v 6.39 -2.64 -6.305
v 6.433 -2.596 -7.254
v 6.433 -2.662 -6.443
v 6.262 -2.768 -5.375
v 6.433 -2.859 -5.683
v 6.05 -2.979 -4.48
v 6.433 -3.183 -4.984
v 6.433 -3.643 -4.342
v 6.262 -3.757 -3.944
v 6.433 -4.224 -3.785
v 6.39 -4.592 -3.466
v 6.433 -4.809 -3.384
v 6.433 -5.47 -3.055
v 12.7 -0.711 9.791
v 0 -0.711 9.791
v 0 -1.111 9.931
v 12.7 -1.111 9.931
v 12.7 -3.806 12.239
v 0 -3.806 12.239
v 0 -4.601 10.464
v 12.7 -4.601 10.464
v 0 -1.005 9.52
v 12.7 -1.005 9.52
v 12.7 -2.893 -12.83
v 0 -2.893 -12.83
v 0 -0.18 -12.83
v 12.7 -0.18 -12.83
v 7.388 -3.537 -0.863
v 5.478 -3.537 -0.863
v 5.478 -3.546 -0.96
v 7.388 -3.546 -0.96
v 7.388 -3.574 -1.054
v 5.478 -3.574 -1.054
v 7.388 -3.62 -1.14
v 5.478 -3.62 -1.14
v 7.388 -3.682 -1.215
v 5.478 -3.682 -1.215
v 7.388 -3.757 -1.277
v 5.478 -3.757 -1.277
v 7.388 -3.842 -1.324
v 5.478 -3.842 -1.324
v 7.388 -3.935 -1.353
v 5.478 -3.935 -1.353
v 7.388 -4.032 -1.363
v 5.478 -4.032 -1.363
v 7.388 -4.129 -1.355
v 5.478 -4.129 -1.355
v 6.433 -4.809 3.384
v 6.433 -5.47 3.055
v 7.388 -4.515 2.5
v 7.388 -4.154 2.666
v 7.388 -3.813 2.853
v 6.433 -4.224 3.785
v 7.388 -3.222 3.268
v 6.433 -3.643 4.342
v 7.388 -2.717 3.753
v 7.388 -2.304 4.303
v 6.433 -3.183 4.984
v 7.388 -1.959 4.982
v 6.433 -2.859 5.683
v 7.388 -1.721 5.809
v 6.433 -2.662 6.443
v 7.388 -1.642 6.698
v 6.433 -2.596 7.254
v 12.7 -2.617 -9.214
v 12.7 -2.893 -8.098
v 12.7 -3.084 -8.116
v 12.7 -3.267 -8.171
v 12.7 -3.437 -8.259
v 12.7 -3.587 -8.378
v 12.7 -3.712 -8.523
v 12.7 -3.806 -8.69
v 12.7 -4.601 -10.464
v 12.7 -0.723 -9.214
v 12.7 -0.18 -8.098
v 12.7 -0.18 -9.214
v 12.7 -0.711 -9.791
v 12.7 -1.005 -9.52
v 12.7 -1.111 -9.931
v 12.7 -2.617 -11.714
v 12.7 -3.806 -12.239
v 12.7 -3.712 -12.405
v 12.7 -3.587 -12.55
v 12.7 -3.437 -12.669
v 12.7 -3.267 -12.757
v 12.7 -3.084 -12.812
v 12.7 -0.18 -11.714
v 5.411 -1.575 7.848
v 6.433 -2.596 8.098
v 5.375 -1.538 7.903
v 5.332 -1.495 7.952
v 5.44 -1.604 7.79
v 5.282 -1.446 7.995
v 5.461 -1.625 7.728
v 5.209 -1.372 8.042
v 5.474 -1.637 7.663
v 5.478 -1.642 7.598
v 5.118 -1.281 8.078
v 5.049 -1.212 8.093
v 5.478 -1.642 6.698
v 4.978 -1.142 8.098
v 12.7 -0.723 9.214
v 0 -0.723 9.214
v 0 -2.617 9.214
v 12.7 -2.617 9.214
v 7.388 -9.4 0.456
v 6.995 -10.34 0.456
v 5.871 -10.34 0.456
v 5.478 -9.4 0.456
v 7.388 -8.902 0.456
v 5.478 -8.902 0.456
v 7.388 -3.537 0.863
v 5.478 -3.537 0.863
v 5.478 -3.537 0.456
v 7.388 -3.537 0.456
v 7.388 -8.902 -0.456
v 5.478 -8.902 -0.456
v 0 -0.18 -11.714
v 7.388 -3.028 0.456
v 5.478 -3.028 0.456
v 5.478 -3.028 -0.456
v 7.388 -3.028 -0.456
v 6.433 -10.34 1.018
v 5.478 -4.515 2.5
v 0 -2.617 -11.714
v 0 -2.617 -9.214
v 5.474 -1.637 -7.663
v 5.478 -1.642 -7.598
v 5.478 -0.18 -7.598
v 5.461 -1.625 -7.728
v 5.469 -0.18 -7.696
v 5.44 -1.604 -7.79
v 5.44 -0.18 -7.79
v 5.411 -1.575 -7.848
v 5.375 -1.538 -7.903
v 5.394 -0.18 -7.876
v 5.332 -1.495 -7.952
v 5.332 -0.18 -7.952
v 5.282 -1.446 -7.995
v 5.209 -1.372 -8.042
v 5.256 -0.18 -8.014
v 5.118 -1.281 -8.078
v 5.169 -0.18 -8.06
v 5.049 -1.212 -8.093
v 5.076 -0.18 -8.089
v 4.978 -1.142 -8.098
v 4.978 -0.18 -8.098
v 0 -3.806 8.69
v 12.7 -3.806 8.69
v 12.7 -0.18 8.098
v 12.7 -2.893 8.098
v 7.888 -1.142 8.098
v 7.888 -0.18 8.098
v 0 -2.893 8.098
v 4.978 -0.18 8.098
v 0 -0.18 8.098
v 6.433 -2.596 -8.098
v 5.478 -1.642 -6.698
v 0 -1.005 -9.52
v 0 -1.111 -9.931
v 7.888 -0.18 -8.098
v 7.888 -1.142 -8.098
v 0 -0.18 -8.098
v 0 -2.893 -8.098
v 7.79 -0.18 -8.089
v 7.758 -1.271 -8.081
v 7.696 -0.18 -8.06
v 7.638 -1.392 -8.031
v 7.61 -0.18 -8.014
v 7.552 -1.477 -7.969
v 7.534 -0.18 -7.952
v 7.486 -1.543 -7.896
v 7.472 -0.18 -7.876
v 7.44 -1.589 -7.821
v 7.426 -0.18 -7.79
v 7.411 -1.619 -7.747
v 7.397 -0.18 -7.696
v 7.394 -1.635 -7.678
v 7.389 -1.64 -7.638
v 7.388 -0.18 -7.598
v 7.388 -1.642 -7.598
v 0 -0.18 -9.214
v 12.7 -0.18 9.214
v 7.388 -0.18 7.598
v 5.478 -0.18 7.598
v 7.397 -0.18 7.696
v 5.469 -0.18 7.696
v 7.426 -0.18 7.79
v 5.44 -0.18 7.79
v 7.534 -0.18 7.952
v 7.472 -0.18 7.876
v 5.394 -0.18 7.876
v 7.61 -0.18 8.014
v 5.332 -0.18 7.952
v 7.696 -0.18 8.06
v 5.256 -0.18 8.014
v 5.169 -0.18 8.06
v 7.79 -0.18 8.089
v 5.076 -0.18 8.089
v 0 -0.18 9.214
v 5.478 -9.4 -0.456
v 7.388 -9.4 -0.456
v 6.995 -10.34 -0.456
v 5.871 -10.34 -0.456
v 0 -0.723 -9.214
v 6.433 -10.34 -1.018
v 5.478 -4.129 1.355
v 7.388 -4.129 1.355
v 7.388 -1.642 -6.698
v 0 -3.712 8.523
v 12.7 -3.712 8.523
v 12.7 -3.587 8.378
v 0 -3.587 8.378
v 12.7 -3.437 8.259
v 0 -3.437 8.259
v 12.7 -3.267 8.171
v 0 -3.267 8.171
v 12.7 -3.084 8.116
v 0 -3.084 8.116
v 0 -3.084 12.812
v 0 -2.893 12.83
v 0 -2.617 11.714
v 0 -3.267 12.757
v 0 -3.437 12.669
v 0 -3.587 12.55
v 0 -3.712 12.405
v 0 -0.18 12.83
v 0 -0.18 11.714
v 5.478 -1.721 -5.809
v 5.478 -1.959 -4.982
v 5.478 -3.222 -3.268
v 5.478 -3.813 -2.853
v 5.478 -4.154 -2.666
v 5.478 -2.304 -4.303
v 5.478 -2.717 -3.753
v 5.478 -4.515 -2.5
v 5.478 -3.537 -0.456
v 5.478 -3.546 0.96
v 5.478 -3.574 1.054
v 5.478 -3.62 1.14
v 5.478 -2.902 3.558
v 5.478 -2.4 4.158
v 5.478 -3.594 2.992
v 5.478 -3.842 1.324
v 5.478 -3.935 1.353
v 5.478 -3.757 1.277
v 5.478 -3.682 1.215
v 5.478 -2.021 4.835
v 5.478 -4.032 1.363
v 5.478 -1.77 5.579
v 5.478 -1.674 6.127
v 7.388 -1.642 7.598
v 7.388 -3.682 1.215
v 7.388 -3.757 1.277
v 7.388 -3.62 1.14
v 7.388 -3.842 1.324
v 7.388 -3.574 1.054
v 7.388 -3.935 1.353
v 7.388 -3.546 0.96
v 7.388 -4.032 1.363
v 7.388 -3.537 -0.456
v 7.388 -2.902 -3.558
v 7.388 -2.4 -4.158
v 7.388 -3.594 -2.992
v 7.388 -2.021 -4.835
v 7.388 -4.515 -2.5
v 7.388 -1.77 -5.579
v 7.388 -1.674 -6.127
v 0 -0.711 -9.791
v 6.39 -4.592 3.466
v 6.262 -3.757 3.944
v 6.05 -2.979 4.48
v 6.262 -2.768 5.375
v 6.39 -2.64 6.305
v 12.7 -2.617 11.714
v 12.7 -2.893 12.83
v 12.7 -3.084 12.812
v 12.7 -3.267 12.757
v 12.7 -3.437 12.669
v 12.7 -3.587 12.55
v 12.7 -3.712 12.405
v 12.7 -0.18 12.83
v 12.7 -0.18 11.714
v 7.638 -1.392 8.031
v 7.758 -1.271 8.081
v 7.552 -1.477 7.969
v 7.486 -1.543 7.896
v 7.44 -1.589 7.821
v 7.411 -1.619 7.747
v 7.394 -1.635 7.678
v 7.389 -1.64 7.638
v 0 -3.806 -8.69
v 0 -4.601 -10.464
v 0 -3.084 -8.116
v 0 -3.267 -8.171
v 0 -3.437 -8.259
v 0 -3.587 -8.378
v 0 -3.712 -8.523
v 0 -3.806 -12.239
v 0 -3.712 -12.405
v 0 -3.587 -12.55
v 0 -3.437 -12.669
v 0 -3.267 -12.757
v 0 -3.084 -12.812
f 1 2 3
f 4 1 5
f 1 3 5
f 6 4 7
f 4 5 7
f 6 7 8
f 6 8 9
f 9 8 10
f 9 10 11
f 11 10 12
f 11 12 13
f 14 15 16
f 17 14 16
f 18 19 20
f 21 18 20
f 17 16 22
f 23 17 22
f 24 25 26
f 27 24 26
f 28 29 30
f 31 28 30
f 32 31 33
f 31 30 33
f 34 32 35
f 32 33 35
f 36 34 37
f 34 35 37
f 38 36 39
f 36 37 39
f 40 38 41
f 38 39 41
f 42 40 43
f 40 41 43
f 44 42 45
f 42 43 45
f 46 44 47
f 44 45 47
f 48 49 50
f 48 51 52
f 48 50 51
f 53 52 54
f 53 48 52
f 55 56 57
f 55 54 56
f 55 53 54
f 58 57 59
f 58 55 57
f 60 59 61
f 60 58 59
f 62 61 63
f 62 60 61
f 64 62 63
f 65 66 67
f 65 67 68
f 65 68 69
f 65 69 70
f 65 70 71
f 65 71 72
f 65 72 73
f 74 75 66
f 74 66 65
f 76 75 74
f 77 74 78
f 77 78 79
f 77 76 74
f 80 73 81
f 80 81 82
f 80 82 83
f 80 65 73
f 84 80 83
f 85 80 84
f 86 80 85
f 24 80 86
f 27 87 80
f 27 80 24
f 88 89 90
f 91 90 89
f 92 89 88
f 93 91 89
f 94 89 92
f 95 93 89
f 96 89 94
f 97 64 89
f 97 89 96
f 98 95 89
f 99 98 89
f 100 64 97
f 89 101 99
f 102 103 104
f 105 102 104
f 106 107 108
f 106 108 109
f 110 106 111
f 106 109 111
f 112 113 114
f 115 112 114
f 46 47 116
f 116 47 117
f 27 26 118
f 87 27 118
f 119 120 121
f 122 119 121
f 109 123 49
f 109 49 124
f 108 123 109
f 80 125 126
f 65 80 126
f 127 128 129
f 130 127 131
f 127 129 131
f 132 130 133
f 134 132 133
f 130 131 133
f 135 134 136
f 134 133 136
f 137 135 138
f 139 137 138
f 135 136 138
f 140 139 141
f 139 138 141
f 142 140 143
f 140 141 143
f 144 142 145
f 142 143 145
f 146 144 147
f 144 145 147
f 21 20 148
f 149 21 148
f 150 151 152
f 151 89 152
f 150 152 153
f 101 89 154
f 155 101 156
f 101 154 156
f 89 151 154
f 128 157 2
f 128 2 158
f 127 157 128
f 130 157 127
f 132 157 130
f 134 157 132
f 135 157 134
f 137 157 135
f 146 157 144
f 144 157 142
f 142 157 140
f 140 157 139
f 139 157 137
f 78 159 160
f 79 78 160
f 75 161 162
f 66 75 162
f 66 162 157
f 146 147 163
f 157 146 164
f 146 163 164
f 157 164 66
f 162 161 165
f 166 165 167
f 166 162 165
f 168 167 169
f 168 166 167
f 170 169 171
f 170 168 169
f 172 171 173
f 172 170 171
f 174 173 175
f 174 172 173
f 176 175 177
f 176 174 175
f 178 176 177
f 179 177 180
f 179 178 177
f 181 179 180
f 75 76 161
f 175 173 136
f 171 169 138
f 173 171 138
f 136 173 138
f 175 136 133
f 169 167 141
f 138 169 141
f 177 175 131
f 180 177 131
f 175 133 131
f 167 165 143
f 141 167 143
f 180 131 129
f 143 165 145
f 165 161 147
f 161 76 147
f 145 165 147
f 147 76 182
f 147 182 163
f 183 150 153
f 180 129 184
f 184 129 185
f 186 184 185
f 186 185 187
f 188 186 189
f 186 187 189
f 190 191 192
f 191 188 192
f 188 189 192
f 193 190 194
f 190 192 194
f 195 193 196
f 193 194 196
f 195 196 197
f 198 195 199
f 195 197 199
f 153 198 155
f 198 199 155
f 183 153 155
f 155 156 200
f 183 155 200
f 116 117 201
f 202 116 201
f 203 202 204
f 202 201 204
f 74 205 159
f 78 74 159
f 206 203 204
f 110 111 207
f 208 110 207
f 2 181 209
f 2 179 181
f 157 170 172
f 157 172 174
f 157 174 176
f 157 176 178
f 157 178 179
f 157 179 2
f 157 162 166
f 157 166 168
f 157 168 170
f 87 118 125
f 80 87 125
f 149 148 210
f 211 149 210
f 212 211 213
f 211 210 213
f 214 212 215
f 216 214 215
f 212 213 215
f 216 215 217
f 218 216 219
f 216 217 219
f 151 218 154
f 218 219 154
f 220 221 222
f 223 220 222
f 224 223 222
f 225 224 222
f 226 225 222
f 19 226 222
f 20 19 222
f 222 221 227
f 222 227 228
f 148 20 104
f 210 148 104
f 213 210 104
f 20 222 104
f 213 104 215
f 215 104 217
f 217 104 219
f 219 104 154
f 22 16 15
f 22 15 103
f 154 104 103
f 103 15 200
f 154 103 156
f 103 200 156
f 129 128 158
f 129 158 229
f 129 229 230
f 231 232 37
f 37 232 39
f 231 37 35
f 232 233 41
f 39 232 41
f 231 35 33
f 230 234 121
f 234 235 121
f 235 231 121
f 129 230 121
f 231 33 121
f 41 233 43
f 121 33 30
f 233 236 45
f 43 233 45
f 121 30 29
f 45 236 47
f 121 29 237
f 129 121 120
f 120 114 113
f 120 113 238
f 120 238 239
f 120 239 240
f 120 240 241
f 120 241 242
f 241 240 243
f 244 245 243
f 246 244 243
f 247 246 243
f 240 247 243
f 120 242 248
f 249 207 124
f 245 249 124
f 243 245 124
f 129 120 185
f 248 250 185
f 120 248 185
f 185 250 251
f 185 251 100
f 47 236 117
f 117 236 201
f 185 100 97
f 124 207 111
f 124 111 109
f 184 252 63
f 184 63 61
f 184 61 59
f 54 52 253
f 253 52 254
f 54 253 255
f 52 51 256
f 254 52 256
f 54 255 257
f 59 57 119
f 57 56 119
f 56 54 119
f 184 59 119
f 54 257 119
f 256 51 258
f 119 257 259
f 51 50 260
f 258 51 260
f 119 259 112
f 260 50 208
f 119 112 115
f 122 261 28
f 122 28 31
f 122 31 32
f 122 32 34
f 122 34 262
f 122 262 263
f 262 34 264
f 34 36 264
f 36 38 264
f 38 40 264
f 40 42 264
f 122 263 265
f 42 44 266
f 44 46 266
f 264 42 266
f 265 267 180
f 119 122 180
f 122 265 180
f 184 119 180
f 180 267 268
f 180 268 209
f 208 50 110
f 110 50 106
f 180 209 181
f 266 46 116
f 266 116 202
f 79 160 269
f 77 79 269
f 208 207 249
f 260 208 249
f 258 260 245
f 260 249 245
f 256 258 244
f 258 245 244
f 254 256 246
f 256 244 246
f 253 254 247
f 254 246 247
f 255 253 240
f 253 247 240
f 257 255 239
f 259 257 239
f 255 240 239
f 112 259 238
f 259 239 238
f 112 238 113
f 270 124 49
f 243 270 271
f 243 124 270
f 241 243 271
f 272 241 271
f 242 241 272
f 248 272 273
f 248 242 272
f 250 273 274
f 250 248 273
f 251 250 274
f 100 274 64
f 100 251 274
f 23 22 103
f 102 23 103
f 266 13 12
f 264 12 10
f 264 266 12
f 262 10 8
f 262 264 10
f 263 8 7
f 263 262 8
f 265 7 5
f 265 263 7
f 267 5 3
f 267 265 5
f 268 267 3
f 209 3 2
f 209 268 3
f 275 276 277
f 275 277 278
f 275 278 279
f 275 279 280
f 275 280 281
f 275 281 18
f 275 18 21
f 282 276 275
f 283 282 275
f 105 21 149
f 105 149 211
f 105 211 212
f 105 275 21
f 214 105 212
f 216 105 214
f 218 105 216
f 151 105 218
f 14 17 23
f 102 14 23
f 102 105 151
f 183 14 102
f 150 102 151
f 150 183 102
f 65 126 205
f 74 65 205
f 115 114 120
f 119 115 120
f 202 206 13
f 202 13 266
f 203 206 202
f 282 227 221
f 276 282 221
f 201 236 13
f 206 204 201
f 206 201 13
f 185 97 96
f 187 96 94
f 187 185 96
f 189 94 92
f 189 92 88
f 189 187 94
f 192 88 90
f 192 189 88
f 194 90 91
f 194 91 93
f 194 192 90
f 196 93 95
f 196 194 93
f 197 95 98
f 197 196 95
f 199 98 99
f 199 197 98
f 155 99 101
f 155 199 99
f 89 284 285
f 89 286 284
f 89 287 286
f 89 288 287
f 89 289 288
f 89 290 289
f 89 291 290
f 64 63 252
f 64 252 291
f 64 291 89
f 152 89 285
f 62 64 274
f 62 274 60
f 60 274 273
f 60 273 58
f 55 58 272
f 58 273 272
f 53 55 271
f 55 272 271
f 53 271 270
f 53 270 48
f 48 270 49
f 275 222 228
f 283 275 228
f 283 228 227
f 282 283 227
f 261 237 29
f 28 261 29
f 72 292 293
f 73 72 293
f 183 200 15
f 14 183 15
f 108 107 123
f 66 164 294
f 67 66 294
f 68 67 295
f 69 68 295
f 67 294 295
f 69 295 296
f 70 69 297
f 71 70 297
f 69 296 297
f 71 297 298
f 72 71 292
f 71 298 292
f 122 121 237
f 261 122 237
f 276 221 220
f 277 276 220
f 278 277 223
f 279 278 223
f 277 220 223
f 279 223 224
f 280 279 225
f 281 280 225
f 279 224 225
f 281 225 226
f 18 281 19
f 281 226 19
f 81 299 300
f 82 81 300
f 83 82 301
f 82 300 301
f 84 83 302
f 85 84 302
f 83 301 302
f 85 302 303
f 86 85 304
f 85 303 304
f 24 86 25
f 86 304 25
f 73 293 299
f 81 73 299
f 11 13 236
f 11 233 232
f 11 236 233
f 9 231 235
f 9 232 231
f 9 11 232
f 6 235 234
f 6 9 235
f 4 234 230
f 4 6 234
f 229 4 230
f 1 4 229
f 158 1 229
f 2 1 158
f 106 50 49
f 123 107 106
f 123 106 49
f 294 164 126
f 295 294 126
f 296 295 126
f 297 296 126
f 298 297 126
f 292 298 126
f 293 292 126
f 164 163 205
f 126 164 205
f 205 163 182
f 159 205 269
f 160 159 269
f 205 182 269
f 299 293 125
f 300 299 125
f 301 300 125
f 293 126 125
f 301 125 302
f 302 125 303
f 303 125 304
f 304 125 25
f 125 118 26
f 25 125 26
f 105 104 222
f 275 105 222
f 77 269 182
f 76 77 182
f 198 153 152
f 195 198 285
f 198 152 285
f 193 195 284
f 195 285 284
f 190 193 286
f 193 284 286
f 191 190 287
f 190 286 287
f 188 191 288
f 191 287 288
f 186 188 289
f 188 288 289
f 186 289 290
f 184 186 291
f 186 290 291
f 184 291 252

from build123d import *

# Parameters (mm, degrees)
BOSS_EXTRUDE1_DEPTH   = 12.7
BOSS_EXTRUDE1_2_DEPTH = 12.7
BOSS_EXTRUDE2_REACH   = 26.909
CUT_EXTRUDE2_REACH    = 19.991
FILLET1_R             = 6.35
FILLET3_R             = 0.5


with BuildPart() as part:
    # Sketch1 → Boss-Extrude1 (new body)
    with BuildSketch(Plane(origin=(0, 0, 0), x_dir=(0, 0, -1), z_dir=(1, 0, 0))):
        with BuildLine():
            Line((9.214036359, -0.723419074), (9.52014781, -1.005011796))
            Line((9.52014781, -1.005011796), (9.931084378, -1.111282001))
            Line((9.931084378, -1.111282001), (9.790954894, -0.710625106))
            Line((9.790954894, -0.710625106), (9.214036359, -0.17991624))
            Line((9.214036359, -0.17991624), (8.098182028, -0.17991624))
            Line((8.098182028, -0.17991624), (8.098182028, -2.893389425))
            ThreePointArc((8.098182028, -2.893389425), (8.258948932, -3.437161263), (8.68955765, -3.80609207))
            Line((8.68955765, -3.80609207), (10.464036359, -4.600540583))
            Line((10.464036359, -4.600540583), (12.238515069, -3.80609207))
            ThreePointArc((12.238515069, -3.80609207), (12.669123787, -3.437161263), (12.829890691, -2.893389425))
            Line((12.829890691, -2.893389425), (12.829890691, -0.17991624))
            Line((12.829890691, -0.17991624), (11.714036359, -0.17991624))
            Line((11.714036359, -0.17991624), (11.714036359, -2.617334806))
            Line((11.714036359, -2.617334806), (9.214036359, -2.617334806))
            Line((9.214036359, -2.617334806), (9.214036359, -0.723419074))
        make_face()
    extrude(amount=BOSS_EXTRUDE1_DEPTH)


with BuildPart() as body_2:
    # Sketch1 → Boss-Extrude1 2 (new body)
    with BuildSketch(Plane(origin=(0, 0, 0), x_dir=(0, 0, -1), z_dir=(1, 0, 0))):
        with BuildLine():
            Line((-8.098182028, -0.17991624), (-9.214036359, -0.17991624))
            Line((-9.214036359, -0.17991624), (-9.790954894, -0.710625106))
            Line((-9.790954894, -0.710625106), (-9.931084378, -1.111282001))
            Line((-9.931084378, -1.111282001), (-9.52014781, -1.005011796))
            Line((-9.52014781, -1.005011796), (-9.214036359, -0.723419074))
            Line((-9.214036359, -0.723419074), (-9.214036359, -2.617334806))
            Line((-9.214036359, -2.617334806), (-11.714036359, -2.617334806))
            Line((-11.714036359, -2.617334806), (-11.714036359, -0.17991624))
            Line((-11.714036359, -0.17991624), (-12.829890691, -0.17991624))
            Line((-12.829890691, -0.17991624), (-12.829890691, -2.893389425))
            ThreePointArc((-12.829890691, -2.893389425), (-12.669123787, -3.437161263), (-12.238515069, -3.80609207))
            Line((-12.238515069, -3.80609207), (-10.464036359, -4.600540583))
            Line((-10.464036359, -4.600540583), (-8.68955765, -3.80609207))
            ThreePointArc((-8.68955765, -3.80609207), (-8.258948932, -3.437161263), (-8.098182028, -2.893389425))
            Line((-8.098182028, -2.893389425), (-8.098182028, -0.17991624))
        make_face()
    extrude(amount=BOSS_EXTRUDE1_2_DEPTH)

    # Sketch2 → Boss-Extrude2 (add, up to next)
    with BuildSketch(Plane.XY.offset(-8.098182028), mode=Mode.PRIVATE) as boss_extrude2_sk1:
        Polygon((5.47811731, -0.17991624), (7.387826905, -0.17991624), (7.387826905, -1.641579788), (6.432972108, -2.596434586), (5.47811731, -1.641579788), align=None)
    boss_extrude2_tool1 = extrude(boss_extrude2_sk1.sketch, amount=BOSS_EXTRUDE2_REACH, mode=Mode.PRIVATE) - body_2.part

    add(part.part)  # Boss-Extrude2 merges part
    add(boss_extrude2_tool1.solids().sort_by_distance((6.432972, -1.169053, -8.098182))[0])

    # Sketch5 → Loft4 section 0
    with BuildSketch(Plane(origin=(0, -0.17991624, 0), x_dir=(1, 0, 0), z_dir=(0, 1, 0))):
        with BuildLine():
            Line((7.387826905, 4.313769845), (7.387826905, -4.313769845))
            Line((7.387826905, -4.313769845), (6.432972108, -5.268624642))
            Line((6.432972108, -5.268624642), (5.47811731, -4.313769845))
            Line((5.47811731, -4.313769845), (5.47811731, 4.313769845))
            Line((5.47811731, 4.313769845), (6.432972108, 5.268624642))
            Line((6.432972108, 5.268624642), (7.387826905, 4.313769845))
        make_face()
    # Sketch6 → Loft4 section 1
    with BuildSketch(Plane(origin=(0, -10.33991624, 0), x_dir=(1, 0, 0), z_dir=(0, 1, 0))):
        with BuildLine():
            Line((6.432972108, -1.017808112), (5.47811731, -0.062953314))
            Line((5.47811731, -0.062953314), (5.47811731, 0.062953314))
            Line((5.47811731, 0.062953314), (6.432972108, 1.017808112))
            Line((6.432972108, 1.017808112), (7.387826905, 0.062953314))
            Line((7.387826905, 0.062953314), (7.387826905, -0.062953314))
            Line((7.387826905, -0.062953314), (6.432972108, -1.017808112))
        make_face()
    loft()

    # Sketch4 → Cut-Extrude2 (cut, up to next)
    with BuildSketch(Plane.ZY.offset(-5.47811731), mode=Mode.PRIVATE) as cut_extrude2_sk1:
        with BuildLine():
            Line((0.863271786, -3.536832517), (0.455999977, -3.536832517))
            Line((0.455999977, -3.536832517), (0.455999977, -3.028389789))
            Line((0.455999977, -3.028389789), (-0.455999977, -3.028389789))
            Line((-0.455999977, -3.028389789), (-0.455999977, -3.536832517))
            Line((-0.455999977, -3.536832517), (-0.863271786, -3.536832517))
            ThreePointArc((-0.863271786, -3.536832517), (-1.248147381, -3.717660499), (-1.354637866, -4.129349409))
            Line((-1.354637866, -4.129349409), (-0.455999977, -8.902101345))
            Line((-0.455999977, -8.902101345), (-0.455999977, -12.003161214))
            Line((-0.455999977, -12.003161214), (0.455999977, -12.003161214))
            Line((0.455999977, -12.003161214), (0.455999977, -8.902101345))
            Line((0.455999977, -8.902101345), (1.354637866, -4.129349409))
            ThreePointArc((1.354637866, -4.129349409), (1.248147381, -3.717660499), (0.863271786, -3.536832517))
        make_face()
    cut_extrude2_tool1 = extrude(cut_extrude2_sk1.sketch, amount=-CUT_EXTRUDE2_REACH, mode=Mode.PRIVATE) & body_2.part
    add(cut_extrude2_tool1.solids().sort_by_distance((5.478117, -6.679281, 0))[0], mode=Mode.SUBTRACT)

    # Fillet1
    # the kernel refuses this fillet: 6.35 mm, written as the material it adds along each edge
    with BuildSketch(Plane(origin=(11.918265355, 2.888858661, -1.067268312), x_dir=(0.268949751125616, 0.268949751125617, -0.9248416419792839), z_dir=(-0.6539617965672524, -0.6539617965672533, -0.3803523856387155))) as fillet1_piece_1_section:
        with BuildLine():
            CenterArc((FILLET1_R * 0.436389328948, FILLET1_R), FILLET1_R, 222.8481144, 47.1518856)
            Line((-FILLET1_R * 0.296769712888, FILLET1_R * 0.319942782278), (0, 0))
            Line((0, 0), (FILLET1_R * 0.436389328948, 0))
        make_face()
    fillet1_piece_1 = extrude(amount=15.315469113, mode=Mode.PRIVATE)
    fillet1_piece_1 = split(fillet1_piece_1, bisect_by=Plane(origin=(7.387826905, 2.888858661, -1.067268312), z_dir=(-1, 0, 0)), keep=Keep.TOP, mode=Mode.PRIVATE)
    fillet1_piece_1 = fillet1_piece_1 - Plane(origin=(0.404018799, -5.547737398, -6.35885034), x_dir=(0.7071067811865474, 0.7071067811865479, 0), z_dir=(0.6539617965672531, -0.6539617965672526, -0.38035238563871554)) * Cylinder(6.35, 42, mode=Mode.PRIVATE)
    add(fillet1_piece_1)
    with BuildSketch(Plane(origin=(10.963410557, -7.126873035, -6.892543527), x_dir=(-0.26894975112561653, 0.26894975112561653, -0.9248416419792839), z_dir=(-0.6539617965672532, 0.6539617965672525, 0.38035238563871554))) as fillet1_piece_2_section:
        with BuildLine():
            CenterArc((FILLET1_R * 0.436389328948, FILLET1_R), FILLET1_R, 222.8481144, 47.1518856)
            Line((-FILLET1_R * 0.296769712888, FILLET1_R * 0.319942782278), (0, 0))
            Line((0, 0), (FILLET1_R * 0.436389328948, 0))
        make_face()
    fillet1_piece_2 = extrude(amount=15.315469113, mode=Mode.PRIVATE)
    fillet1_piece_2 = split(fillet1_piece_2, bisect_by=Plane(origin=(5.47811731, -7.126873035, -6.892543527), z_dir=(1, 0, 0)), keep=Keep.TOP, mode=Mode.PRIVATE)
    fillet1_piece_2 = fillet1_piece_2 - Plane(origin=(11.012970172, -6.996692643, -7.201580889), x_dir=(-0.707106781186548, 0.7071067811865471, 0), z_dir=(0.6539617965672524, 0.6539617965672532, 0.38035238563871543)) * Cylinder(6.35, 42, mode=Mode.PRIVATE)
    add(fillet1_piece_2)
    with BuildSketch(Plane(origin=(1.902533659, -7.126873035, 6.892543527), x_dir=(0.33552051071253974, -0.7013229496273355, -0.6289452338774898), z_dir=(0.6539617965672524, 0.6539617965672533, -0.3803523856387155))) as fillet1_piece_3_section:
        with BuildLine():
            CenterArc((FILLET1_R * 0.436389328948, -FILLET1_R), FILLET1_R, 90, 47.1518856)
            Line((-FILLET1_R * 0.296769712888, -FILLET1_R * 0.319942782278), (0, 0))
            Line((0, 0), (FILLET1_R * 0.436389328948, 0))
        make_face()
    fillet1_piece_3 = extrude(amount=15.315469113, mode=Mode.PRIVATE)
    fillet1_piece_3 = split(fillet1_piece_3, bisect_by=Plane(origin=(7.387826905, -7.126873035, 6.892543527), z_dir=(-1, 0, 0)), keep=Keep.TOP, mode=Mode.PRIVATE)
    fillet1_piece_3 = fillet1_piece_3 - Plane(origin=(1.852974044, -6.996692643, 7.201580889), x_dir=(0.7071067811865474, 0.7071067811865479, 0), z_dir=(-0.6539617965672531, 0.6539617965672526, -0.38035238563871554)) * Cylinder(6.35, 42, mode=Mode.PRIVATE)
    add(fillet1_piece_3)
    with BuildSketch(Plane(origin=(0.947678861, 2.888858661, 1.067268313), x_dir=(-0.26894975112561653, 0.26894975112561653, 0.9248416419792839), z_dir=(0.6539617965672532, -0.6539617965672525, 0.38035238563871554))) as fillet1_piece_4_section:
        with BuildLine():
            CenterArc((FILLET1_R * 0.436389328948, FILLET1_R), FILLET1_R, 222.8481144, 47.1518856)
            Line((-FILLET1_R * 0.296769712888, FILLET1_R * 0.319942782278), (0, 0))
            Line((0, 0), (FILLET1_R * 0.436389328948, 0))
        make_face()
    fillet1_piece_4 = extrude(amount=15.315469113, mode=Mode.PRIVATE)
    fillet1_piece_4 = split(fillet1_piece_4, bisect_by=Plane(origin=(5.47811731, 2.888858661, 1.067268313), z_dir=(1, 0, 0)), keep=Keep.TOP, mode=Mode.PRIVATE)
    fillet1_piece_4 = fillet1_piece_4 - Plane(origin=(12.461925417, -5.547737398, 6.35885034), x_dir=(-0.6780560120828721, 0.28369012840869895, -0.6780560120828721), z_dir=(-0.6539617965672524, -0.6539617965672532, 0.3803523856387155)) * Cylinder(6.35, 42, mode=Mode.PRIVATE)
    add(fillet1_piece_4)

    # Fillet3
    fillet3_edges = [body_2.edges().sort_by_distance(p)[0] for p in [
        (7.387826905, -0.910748014, 8.098182028),
        (5.47811731, -0.910748014, 8.098182028),
        (7.387826905, -0.910748014, -8.098182028),
        (5.47811731, -0.910748014, -8.098182028),
    ]]
    fillet(fillet3_edges, radius=FILLET3_R)


solid = body_2.part
